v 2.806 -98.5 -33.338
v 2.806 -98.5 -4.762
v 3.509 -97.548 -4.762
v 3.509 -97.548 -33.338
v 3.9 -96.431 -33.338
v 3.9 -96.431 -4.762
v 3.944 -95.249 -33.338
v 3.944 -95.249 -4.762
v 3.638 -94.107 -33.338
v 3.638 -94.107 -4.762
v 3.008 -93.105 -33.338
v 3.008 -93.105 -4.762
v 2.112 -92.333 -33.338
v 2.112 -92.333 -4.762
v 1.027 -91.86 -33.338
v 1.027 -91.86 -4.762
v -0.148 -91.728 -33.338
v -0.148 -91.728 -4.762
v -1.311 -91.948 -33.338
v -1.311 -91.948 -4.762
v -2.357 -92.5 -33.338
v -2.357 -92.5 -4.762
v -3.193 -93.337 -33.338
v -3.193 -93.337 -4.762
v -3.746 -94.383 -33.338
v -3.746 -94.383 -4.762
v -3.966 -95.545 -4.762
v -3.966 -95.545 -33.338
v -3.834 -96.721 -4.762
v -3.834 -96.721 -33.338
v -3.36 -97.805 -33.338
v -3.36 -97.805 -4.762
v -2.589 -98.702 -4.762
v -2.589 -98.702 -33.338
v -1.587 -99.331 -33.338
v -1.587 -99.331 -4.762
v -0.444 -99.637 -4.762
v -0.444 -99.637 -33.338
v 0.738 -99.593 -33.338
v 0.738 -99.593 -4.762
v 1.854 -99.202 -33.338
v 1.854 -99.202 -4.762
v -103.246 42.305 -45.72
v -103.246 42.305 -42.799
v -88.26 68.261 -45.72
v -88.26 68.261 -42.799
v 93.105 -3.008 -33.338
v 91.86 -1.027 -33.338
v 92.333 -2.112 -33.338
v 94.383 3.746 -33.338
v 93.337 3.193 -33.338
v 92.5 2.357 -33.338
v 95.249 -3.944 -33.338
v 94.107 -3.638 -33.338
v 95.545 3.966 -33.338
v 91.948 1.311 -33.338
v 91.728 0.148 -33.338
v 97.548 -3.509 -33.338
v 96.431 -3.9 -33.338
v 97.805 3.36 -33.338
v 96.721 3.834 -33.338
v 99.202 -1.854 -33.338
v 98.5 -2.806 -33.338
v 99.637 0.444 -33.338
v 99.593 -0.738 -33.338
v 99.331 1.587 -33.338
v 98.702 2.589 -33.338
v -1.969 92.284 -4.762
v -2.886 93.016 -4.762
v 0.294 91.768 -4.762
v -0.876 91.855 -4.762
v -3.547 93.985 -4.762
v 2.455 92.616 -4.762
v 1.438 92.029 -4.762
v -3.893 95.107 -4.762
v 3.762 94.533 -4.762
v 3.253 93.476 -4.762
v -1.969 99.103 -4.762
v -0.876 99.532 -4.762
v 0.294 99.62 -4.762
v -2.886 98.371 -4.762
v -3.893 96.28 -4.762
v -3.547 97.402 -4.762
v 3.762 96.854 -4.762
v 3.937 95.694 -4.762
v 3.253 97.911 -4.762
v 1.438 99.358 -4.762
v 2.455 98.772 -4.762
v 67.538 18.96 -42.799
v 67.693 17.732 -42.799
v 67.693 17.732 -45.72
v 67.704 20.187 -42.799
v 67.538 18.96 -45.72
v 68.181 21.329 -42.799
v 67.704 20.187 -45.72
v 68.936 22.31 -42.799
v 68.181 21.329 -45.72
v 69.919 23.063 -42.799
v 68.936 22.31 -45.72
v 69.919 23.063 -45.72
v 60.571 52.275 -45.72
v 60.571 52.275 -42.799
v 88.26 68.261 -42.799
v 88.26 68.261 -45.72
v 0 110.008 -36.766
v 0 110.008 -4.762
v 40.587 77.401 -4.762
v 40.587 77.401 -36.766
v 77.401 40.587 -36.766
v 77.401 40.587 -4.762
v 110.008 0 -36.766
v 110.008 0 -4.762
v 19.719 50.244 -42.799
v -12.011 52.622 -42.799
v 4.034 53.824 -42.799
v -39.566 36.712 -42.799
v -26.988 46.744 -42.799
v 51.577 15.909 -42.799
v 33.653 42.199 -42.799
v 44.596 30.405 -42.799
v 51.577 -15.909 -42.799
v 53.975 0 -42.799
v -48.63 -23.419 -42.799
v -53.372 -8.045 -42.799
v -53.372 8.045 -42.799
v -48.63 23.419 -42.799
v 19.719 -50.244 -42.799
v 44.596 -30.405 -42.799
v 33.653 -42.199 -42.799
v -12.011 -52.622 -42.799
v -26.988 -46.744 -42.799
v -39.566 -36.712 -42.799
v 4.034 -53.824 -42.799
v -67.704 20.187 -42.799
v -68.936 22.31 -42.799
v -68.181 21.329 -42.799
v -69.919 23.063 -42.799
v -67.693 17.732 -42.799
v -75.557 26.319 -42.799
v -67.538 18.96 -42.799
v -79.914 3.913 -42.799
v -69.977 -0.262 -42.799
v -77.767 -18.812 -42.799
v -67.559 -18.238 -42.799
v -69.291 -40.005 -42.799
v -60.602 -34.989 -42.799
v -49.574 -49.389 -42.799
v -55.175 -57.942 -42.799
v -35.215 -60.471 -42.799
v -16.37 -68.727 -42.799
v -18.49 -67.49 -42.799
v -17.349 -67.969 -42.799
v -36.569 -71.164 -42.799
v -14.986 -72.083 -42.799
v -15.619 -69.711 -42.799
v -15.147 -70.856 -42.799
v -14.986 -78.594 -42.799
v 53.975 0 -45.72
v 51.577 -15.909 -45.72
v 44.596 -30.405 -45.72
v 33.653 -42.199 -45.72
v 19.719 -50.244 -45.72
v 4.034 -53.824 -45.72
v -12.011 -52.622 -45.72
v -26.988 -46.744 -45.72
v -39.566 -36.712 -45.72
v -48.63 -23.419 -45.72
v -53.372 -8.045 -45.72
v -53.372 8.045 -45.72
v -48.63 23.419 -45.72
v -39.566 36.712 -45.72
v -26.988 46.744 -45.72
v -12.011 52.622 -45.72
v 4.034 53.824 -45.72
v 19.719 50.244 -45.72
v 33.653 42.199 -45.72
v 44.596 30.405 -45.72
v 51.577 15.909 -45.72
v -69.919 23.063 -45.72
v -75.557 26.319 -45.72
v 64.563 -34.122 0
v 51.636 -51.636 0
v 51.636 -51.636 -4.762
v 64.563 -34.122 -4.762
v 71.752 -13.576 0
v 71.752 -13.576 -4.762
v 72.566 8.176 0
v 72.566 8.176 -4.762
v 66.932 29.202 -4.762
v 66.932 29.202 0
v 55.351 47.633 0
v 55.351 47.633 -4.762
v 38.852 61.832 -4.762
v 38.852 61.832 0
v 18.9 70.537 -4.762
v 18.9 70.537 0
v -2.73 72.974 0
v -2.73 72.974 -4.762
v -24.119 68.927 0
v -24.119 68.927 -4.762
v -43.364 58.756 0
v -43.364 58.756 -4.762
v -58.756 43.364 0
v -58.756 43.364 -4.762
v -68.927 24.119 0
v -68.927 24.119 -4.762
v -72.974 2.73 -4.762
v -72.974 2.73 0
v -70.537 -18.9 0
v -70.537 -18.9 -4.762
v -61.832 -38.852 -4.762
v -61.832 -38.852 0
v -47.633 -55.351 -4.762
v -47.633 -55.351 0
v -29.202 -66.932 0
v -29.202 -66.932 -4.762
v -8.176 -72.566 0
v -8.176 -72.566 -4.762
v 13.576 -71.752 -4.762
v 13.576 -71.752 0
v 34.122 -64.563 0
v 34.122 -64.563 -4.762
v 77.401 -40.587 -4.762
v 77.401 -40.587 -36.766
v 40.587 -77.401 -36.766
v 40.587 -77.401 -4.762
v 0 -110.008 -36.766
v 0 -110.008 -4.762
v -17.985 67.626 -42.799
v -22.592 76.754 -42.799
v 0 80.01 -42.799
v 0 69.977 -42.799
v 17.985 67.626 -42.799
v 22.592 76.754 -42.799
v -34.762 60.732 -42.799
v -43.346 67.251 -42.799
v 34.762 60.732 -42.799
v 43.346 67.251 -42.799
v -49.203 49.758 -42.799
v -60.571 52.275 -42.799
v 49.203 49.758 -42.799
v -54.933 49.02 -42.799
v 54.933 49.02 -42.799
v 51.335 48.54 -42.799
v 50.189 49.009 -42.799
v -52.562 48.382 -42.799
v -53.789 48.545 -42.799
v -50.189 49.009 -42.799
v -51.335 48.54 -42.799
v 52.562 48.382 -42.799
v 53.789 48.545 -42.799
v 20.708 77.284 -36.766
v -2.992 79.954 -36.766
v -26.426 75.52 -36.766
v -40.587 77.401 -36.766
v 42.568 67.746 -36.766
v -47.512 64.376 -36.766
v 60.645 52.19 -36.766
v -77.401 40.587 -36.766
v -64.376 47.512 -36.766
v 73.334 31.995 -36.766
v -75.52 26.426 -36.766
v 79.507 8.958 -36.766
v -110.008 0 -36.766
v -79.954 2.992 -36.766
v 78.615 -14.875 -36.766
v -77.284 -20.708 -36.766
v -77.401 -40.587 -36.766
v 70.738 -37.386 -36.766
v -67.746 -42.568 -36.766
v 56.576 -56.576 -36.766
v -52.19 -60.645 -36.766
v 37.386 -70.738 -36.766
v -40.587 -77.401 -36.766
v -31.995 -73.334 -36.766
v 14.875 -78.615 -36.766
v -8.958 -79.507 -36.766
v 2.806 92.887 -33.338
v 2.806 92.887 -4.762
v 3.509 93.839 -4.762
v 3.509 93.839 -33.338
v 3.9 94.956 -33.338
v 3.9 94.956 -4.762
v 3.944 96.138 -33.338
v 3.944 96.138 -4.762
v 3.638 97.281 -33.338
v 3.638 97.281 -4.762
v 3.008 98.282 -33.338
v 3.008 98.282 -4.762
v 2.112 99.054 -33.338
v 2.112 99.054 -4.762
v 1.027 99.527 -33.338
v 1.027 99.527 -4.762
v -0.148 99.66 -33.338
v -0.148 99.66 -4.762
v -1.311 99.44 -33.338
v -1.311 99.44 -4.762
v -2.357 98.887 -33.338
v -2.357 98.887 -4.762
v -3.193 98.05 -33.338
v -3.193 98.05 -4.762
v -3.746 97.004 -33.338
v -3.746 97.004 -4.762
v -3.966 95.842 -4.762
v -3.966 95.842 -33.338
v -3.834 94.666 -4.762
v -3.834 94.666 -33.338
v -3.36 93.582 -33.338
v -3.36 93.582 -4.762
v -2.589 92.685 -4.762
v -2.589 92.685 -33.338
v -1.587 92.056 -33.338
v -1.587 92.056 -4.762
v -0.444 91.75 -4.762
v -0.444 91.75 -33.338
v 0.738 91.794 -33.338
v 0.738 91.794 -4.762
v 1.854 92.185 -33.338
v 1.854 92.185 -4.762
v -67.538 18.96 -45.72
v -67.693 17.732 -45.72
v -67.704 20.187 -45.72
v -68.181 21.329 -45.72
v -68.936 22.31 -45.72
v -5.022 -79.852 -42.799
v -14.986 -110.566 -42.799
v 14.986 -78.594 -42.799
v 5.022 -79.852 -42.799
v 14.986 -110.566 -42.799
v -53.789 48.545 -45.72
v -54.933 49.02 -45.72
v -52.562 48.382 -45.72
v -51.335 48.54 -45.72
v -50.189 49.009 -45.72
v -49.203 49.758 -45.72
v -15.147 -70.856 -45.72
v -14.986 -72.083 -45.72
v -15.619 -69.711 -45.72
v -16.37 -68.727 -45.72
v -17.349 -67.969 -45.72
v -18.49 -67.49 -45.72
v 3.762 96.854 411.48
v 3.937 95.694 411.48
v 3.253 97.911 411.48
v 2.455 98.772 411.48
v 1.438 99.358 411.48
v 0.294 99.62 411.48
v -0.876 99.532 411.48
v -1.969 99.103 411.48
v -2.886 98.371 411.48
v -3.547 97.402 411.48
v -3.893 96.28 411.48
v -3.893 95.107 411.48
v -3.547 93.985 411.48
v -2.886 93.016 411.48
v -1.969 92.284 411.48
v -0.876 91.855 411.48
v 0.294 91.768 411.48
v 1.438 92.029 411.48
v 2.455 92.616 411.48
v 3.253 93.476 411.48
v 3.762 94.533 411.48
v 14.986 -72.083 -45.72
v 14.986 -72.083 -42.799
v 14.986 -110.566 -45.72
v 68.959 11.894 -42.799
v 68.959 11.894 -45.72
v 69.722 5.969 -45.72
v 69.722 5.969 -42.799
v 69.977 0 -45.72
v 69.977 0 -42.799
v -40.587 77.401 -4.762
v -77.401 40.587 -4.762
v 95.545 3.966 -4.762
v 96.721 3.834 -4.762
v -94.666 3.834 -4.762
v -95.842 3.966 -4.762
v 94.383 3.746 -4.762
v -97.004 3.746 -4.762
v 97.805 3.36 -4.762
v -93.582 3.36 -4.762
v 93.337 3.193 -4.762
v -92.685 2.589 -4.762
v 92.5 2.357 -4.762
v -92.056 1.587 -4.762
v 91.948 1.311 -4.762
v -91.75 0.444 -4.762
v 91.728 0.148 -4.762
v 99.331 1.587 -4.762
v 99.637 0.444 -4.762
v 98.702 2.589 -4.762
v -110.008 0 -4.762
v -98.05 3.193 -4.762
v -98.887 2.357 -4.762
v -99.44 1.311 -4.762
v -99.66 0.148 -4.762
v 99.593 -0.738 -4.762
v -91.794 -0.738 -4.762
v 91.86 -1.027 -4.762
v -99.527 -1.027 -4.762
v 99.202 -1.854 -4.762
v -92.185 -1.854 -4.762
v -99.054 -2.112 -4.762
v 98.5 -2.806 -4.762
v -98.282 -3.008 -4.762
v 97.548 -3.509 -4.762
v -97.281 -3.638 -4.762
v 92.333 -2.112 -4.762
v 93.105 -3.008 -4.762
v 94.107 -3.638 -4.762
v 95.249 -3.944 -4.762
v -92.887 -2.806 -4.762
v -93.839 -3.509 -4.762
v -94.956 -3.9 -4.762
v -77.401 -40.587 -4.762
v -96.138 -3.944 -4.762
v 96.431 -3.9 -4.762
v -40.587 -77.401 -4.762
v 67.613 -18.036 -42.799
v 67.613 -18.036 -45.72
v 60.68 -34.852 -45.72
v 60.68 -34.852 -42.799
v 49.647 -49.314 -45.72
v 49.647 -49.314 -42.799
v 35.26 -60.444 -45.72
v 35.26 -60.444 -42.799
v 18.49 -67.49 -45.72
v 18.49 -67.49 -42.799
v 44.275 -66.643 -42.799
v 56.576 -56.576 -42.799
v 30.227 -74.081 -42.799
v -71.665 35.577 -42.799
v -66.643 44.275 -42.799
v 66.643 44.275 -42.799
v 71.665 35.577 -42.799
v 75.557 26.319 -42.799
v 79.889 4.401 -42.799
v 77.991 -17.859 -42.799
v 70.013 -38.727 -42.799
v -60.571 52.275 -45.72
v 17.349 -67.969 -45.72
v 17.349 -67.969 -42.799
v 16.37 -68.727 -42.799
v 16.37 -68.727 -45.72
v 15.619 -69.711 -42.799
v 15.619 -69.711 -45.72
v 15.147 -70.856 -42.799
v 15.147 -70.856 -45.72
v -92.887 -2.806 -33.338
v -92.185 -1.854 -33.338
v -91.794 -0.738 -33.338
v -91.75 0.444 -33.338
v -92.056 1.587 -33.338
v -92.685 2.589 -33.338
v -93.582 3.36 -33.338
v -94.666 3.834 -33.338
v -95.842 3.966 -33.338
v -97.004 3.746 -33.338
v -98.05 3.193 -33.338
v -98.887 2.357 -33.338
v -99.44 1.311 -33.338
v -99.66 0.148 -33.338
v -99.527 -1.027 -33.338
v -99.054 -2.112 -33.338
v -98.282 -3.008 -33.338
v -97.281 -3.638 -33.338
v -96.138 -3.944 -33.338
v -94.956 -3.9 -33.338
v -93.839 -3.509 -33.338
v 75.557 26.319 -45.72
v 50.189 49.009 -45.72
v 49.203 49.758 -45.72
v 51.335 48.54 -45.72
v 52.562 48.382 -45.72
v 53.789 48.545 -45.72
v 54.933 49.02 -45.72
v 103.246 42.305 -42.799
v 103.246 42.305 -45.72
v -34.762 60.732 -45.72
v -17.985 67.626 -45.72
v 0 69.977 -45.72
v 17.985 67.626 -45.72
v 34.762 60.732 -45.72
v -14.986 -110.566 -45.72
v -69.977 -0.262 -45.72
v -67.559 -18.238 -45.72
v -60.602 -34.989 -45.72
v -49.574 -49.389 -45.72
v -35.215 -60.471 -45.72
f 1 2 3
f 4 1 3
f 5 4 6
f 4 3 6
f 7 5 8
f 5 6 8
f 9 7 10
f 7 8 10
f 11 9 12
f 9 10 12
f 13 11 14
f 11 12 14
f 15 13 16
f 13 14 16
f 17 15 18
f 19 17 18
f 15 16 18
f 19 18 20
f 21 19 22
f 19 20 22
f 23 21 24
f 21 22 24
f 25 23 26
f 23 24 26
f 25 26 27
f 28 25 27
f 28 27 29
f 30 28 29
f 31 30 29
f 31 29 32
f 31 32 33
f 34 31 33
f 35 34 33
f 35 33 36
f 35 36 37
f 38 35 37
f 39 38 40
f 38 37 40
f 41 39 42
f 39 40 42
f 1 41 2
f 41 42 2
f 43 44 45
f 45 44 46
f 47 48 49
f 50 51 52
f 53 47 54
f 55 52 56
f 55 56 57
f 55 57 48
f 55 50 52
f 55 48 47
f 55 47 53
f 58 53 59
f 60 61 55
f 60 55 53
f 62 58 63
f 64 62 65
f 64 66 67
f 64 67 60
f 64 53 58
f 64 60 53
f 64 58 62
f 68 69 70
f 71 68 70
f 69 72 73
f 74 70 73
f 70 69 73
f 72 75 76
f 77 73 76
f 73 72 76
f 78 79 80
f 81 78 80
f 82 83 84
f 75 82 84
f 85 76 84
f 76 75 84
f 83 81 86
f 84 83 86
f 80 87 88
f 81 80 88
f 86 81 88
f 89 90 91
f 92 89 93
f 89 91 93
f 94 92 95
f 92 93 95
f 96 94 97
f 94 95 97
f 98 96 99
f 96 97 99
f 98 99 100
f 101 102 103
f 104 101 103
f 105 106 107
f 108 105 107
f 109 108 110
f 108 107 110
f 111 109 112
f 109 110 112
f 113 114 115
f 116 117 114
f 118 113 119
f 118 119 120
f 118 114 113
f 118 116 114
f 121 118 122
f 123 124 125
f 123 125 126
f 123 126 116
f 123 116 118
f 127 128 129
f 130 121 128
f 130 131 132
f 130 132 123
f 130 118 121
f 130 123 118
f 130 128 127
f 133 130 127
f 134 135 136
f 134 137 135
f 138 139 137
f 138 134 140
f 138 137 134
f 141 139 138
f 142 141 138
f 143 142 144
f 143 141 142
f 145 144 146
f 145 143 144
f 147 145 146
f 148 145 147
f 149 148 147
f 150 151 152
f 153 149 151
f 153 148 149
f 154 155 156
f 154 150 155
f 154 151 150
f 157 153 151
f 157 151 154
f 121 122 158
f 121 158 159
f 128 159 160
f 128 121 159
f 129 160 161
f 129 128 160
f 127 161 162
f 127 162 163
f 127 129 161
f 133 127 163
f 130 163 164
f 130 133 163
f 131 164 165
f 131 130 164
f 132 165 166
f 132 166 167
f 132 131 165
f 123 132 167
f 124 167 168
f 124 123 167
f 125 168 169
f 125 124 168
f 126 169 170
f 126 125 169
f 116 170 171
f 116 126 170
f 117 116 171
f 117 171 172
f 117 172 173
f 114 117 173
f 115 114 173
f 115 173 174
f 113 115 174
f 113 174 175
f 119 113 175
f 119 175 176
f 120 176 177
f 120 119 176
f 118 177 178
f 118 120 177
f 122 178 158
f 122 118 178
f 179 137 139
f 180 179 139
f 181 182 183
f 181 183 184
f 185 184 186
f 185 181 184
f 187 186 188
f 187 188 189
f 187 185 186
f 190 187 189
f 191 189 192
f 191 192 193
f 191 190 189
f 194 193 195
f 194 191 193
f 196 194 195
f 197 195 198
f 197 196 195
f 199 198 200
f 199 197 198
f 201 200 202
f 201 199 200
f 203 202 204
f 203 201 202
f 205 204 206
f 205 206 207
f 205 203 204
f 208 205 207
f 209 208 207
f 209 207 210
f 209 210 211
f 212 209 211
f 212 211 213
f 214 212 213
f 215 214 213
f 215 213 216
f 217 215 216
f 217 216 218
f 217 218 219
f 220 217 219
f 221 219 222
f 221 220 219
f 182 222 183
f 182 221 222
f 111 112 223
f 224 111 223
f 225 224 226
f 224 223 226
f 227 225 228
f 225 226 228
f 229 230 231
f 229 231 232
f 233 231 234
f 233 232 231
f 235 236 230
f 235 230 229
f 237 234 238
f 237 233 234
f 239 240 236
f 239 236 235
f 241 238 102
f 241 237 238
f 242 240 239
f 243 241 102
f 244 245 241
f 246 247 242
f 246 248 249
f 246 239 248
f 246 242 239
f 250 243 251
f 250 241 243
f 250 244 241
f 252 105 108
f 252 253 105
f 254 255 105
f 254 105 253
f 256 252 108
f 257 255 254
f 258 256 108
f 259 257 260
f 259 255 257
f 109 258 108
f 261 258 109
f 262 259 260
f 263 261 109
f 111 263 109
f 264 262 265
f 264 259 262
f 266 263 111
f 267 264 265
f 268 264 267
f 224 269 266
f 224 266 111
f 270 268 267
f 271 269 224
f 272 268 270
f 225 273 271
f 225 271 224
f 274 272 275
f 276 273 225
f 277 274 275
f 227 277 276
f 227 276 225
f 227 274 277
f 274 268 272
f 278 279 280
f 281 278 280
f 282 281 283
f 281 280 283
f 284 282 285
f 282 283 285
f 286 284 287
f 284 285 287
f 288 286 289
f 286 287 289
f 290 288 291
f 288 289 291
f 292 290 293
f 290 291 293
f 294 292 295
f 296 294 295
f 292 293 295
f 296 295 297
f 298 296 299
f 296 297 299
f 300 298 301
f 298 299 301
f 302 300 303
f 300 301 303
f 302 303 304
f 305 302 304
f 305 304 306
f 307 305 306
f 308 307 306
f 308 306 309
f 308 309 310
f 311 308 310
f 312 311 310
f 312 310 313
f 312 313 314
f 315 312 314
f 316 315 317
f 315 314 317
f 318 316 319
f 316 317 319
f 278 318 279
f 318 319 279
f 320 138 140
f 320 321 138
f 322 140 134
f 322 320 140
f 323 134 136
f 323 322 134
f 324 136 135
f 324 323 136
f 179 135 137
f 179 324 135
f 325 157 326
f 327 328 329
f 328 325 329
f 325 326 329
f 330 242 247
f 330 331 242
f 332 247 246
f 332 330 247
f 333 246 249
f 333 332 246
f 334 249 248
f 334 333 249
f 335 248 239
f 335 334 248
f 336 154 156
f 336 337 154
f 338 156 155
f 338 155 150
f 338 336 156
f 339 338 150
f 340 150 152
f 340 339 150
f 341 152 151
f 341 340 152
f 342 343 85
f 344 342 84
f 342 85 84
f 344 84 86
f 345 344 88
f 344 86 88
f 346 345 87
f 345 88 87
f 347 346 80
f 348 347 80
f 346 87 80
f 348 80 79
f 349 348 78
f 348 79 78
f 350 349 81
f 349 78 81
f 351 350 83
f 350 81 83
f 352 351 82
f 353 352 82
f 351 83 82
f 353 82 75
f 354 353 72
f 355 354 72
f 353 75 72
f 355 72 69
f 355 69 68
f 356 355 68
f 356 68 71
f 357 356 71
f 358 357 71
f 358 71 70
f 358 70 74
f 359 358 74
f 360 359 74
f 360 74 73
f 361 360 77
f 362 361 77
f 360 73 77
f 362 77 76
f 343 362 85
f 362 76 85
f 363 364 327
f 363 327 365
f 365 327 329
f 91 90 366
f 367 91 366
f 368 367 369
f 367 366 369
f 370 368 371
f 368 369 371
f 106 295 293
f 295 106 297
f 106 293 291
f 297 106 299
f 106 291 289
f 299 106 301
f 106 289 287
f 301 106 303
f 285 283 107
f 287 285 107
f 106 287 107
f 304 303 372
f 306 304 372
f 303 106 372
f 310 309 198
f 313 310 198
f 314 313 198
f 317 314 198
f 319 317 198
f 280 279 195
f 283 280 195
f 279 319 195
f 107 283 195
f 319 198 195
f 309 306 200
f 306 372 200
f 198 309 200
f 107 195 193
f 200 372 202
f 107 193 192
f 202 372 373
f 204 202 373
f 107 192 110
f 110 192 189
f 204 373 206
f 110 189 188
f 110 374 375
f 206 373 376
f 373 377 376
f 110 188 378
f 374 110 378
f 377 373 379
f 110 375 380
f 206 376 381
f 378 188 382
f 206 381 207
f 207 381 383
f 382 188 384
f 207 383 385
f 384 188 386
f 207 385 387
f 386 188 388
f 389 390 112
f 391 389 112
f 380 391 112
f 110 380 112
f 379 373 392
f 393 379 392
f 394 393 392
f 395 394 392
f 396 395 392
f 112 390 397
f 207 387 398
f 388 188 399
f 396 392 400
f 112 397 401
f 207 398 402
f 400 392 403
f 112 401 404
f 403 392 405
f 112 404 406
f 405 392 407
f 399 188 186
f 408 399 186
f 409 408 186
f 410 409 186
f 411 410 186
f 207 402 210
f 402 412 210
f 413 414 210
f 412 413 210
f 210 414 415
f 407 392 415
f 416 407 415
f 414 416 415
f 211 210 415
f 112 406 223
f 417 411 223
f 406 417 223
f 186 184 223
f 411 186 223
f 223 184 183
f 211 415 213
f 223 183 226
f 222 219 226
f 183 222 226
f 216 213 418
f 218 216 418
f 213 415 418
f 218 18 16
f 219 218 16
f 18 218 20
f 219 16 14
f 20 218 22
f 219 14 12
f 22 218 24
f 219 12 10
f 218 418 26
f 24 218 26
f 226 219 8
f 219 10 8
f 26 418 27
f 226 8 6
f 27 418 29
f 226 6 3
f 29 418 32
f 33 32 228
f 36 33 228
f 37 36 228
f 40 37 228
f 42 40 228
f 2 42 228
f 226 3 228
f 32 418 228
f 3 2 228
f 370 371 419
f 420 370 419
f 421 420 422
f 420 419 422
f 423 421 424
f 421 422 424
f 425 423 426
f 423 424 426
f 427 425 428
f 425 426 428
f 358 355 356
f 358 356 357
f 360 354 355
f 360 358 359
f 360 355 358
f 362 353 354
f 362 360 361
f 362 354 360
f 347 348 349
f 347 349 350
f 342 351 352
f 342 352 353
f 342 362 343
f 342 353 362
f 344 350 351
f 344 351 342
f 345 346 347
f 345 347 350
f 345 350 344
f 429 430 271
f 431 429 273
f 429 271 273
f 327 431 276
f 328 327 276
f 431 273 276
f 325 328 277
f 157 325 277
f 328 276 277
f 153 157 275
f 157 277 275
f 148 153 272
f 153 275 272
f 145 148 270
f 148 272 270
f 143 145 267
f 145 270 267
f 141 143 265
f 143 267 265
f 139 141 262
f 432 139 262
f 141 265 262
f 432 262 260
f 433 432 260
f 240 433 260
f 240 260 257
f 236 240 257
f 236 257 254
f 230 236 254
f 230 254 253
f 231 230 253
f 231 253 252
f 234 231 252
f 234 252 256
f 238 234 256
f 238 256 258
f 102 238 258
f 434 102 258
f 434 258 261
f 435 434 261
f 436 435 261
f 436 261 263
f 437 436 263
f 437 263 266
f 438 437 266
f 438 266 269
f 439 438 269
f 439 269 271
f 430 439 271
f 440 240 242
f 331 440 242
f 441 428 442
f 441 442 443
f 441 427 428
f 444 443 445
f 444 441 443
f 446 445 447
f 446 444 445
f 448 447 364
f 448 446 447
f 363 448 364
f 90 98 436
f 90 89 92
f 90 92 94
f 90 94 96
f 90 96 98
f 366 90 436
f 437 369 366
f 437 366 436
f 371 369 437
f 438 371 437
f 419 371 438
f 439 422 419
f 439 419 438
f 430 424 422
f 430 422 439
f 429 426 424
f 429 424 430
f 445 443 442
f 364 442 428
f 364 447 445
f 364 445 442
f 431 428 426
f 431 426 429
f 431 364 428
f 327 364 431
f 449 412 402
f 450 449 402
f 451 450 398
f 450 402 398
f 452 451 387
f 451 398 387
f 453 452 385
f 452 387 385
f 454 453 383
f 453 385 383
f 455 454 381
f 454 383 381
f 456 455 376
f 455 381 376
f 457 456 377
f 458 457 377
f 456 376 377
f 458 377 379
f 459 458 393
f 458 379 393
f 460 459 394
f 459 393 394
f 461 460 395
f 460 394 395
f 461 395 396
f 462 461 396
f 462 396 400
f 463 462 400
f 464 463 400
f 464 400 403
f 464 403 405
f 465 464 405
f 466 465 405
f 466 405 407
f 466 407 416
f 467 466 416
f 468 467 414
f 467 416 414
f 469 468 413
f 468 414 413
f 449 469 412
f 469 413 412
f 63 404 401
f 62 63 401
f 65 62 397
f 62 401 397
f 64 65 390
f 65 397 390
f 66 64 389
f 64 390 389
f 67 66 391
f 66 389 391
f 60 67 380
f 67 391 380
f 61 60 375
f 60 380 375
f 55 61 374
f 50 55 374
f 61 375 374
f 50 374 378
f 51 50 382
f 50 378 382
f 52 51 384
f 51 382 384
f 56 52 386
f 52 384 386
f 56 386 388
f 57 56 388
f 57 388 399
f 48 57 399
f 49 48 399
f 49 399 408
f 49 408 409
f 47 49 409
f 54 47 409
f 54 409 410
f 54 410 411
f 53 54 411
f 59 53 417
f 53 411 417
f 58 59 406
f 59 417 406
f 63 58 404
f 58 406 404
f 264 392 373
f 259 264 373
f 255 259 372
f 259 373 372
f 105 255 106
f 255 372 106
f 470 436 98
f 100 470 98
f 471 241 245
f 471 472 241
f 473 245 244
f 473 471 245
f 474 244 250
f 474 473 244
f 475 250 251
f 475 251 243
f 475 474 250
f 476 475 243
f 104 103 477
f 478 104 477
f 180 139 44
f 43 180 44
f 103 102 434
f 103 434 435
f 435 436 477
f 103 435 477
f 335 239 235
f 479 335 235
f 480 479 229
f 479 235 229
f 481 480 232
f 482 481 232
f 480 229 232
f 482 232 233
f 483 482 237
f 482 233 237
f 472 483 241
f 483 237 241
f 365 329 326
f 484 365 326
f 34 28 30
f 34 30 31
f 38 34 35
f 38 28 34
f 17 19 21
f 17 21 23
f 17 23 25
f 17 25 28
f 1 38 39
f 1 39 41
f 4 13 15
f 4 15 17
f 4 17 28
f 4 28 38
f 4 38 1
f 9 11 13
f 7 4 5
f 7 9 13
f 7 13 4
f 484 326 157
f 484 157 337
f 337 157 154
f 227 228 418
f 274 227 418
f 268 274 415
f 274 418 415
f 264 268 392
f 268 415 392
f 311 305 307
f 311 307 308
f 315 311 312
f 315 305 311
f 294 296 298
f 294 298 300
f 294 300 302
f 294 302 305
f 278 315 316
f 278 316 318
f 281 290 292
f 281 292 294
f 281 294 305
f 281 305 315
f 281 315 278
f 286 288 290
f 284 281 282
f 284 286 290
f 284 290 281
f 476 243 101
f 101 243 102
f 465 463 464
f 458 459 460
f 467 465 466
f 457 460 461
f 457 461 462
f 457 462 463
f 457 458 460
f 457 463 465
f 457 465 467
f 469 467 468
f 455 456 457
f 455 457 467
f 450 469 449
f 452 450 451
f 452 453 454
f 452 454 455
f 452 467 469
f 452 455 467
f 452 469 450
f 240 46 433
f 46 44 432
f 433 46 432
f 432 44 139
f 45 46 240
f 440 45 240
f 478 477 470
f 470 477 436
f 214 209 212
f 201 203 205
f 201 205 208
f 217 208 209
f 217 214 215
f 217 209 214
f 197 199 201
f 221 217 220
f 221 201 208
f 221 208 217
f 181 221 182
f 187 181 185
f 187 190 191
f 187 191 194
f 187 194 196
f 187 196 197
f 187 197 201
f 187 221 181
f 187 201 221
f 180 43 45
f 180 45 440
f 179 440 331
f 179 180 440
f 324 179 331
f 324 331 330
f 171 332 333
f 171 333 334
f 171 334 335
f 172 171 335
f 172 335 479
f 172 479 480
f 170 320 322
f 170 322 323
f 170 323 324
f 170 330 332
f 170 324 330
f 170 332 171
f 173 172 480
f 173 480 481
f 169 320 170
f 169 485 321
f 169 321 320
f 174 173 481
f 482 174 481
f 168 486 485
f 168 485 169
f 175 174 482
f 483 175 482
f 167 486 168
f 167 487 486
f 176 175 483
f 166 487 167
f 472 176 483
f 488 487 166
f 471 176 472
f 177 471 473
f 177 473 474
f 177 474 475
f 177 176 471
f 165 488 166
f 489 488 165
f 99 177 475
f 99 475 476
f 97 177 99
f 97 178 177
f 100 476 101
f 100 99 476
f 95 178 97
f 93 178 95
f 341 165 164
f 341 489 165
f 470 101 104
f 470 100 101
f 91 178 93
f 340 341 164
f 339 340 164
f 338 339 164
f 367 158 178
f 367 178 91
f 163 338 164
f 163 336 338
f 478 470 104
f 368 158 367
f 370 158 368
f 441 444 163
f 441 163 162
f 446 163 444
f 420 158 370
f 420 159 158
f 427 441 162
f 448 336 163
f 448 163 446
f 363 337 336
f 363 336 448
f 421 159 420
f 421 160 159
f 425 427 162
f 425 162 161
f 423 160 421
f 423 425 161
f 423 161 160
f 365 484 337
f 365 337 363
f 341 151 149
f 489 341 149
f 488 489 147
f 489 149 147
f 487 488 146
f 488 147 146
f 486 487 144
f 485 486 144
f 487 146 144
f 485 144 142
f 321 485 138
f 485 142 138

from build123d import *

# Parameters (mm, degrees)
F0_R      = 73.025
F1_DEPTH  = 4.7625
F3_DEPTH  = 32.004
F4_R      = 3.96875
F5_DEPTH  = 28.575
F6_R      = 80.01
F7_DEPTH  = 6.0325
F9_ANGLE  = -45
F10_R     = 53.975
F11_DEPTH = 2.921
F12_R     = 3.937
F13_DEPTH = 416.2425
F14_R     = 4.7625


with BuildPart() as f1:
    # F0 (on Top) → F1 (new body)
    with BuildSketch(Plane.XY):
        Circle(F0_R)
    extrude(amount=-F1_DEPTH)

    # F2 (on face) → F3 (join)
    with BuildSketch(Plane(origin=(0, 0, -4.7625), x_dir=(1, 0, 0), z_dir=(0, 0, -1))):
        with BuildLine():
            ThreePointArc((-77.7875, 77.7875), (-84.1375, 0), (-77.7875, -77.7875))
            ThreePointArc((-77.7875, -77.7875), (0, -84.1375), (77.7875, -77.7875))
            ThreePointArc((77.7875, -77.7875), (84.1375, 0), (77.7875, 77.7875))
            ThreePointArc((77.7875, 77.7875), (0, 84.1375), (-77.7875, 77.7875))
        make_face()
    extrude(amount=F3_DEPTH)

    # F4 (on face) → F5 (cut)
    with BuildSketch(Plane.XY.offset(-4.7625)):
        with Locations((-67.6656, 67.6656)):
            Circle(F4_R)
        with Locations((-67.6656, -67.6656)):
            Circle(F4_R)
        with Locations((67.6656, -67.6656)):
            Circle(F4_R)
        with Locations((67.6656, 67.6656)):
            Circle(F4_R)
    extrude(amount=-F5_DEPTH, mode=Mode.SUBTRACT)

    # F6 (on face) → F7 (join)
    with BuildSketch(Plane(origin=(0, 0, -36.7665), x_dir=(1, 0, 0), z_dir=(0, 0, -1))):
        Circle(F6_R)
    extrude(amount=F7_DEPTH)


with BuildPart() as f1_1:
    # F9: moved
    add(f1.part.rotate(Axis((0, 0, 32.1254618466), (0, 0, 1)), F9_ANGLE))

    # F10 (on face) → F11 (join)
    with BuildSketch(Plane(origin=(0, 0, -42.799), x_dir=(1, 0, 0), z_dir=(0, 0, -1))):
        with BuildLine():
            Line((-14.986, 68.3534953971), (14.986, 68.3534953971))
            ThreePointArc((14.986, 68.3534953971), (0, 69.977), (-14.986, 68.3534953971))
        make_face()
        with BuildLine():
            Line((-51.7028634513, -47.1550043997), (-66.6888634513, -21.1984909974))
            ThreePointArc((-66.6888634513, -21.1984909974), (-60.6018596806, -34.9885), (-51.7028634513, -47.1550043997))
        make_face()
        with BuildLine():
            ThreePointArc((51.7028634513, -47.1550043997), (60.6018596806, -34.9885), (66.6888634513, -21.1984909974))
            Line((66.6888634513, -21.1984909974), (51.7028634513, -47.1550043997))
        make_face()
        with BuildLine():
            ThreePointArc((66.6888634513, -21.1984909974), (69.1500799954, -10.7259948551), (69.977, 0))
            ThreePointArc((69.977, 0), (54.5227285221, 43.8640240231), (14.986, 68.3534953971))
            Line((14.986, 68.3534953971), (-14.986, 68.3534953971))
            ThreePointArc((-14.986, 68.3534953971), (-60.6018596806, 34.9885), (-66.6888634513, -21.1984909974))
            Line((-66.6888634513, -21.1984909974), (-51.7028634513, -47.1550043997))
            ThreePointArc((-51.7028634513, -47.1550043997), (0, -69.977), (51.7028634513, -47.1550043997))
            Line((51.7028634513, -47.1550043997), (66.6888634513, -21.1984909974))
        make_face()
        Circle(F10_R, mode=Mode.SUBTRACT)
        with BuildLine():
            ThreePointArc((-60.5714174881, -52.2752664601), (-69.2906925568, -40.005), (-75.5574174881, -26.3187530579))
            Line((-75.5574174881, -26.3187530579), (-103.246138, -42.3048432989))
            Line((-103.246138, -42.3048432989), (-88.260138, -68.2613567011))
            Line((-88.260138, -68.2613567011), (-60.5714174881, -52.2752664601))
        make_face()
        with BuildLine():
            Line((103.246138, -42.3048432989), (75.5574174881, -26.3187530579))
            ThreePointArc((75.5574174881, -26.3187530579), (69.2906925568, -40.005), (60.5714174881, -52.2752664601))
            Line((60.5714174881, -52.2752664601), (88.260138, -68.2613567011))
            Line((88.260138, -68.2613567011), (103.246138, -42.3048432989))
        make_face()
        with BuildLine():
            ThreePointArc((-14.986, 68.3534953971), (0, 69.977), (14.986, 68.3534953971))
            Line((14.986, 68.3534953971), (14.986, 78.594019518))
            ThreePointArc((14.986, 78.594019518), (0, 80.01), (-14.986, 78.594019518))
            Line((-14.986, 78.594019518), (-14.986, 68.3534953971))
        make_face()
        with BuildLine():
            ThreePointArc((-51.7028634513, -47.1550043997), (-60.6018596806, -34.9885), (-66.6888634513, -21.1984909974))
            Line((-66.6888634513, -21.1984909974), (-75.5574174881, -26.3187530579))
            ThreePointArc((-75.5574174881, -26.3187530579), (-69.2906925568, -40.005), (-60.5714174881, -52.2752664601))
            Line((-60.5714174881, -52.2752664601), (-51.7028634513, -47.1550043997))
        make_face()
        with BuildLine():
            Line((75.5574174881, -26.3187530579), (66.6888634513, -21.1984909974))
            ThreePointArc((66.6888634513, -21.1984909974), (60.6018596806, -34.9885), (51.7028634513, -47.1550043997))
            Line((51.7028634513, -47.1550043997), (60.5714174881, -52.2752664601))
            ThreePointArc((60.5714174881, -52.2752664601), (69.2906925568, -40.005), (75.5574174881, -26.3187530579))
        make_face()
        with BuildLine():
            ThreePointArc((-14.986, 78.594019518), (0, 80.01), (14.986, 78.594019518))
            Line((14.986, 78.594019518), (14.986, 110.5662))
            Line((14.986, 110.5662), (-14.986, 110.5662))
            Line((-14.986, 110.5662), (-14.986, 78.594019518))
        make_face()
    extrude(amount=F11_DEPTH)

    # F14
    f14_edges = [f1_1.edges().sort_by_distance(p)[0] for p in [
        (14.986, -68.353495, -44.2595),
        (-14.986, -68.353495, -44.2595),
        (-66.688863, 21.198491, -44.2595),
        (-51.702863, 47.155004, -44.2595),
        (51.702863, 47.155004, -44.2595),
        (66.688863, 21.198491, -44.2595),
    ]]
    fillet(f14_edges, radius=F14_R)


with BuildPart() as f13:
    # F12 (on face) → F13 (new body)
    with BuildSketch(Plane.XY.offset(-4.7625)):
        with Locations((0, 95.6936092261)):
            Circle(F12_R)
    extrude(amount=F13_DEPTH)


solid = Compound([f1_1.part, f13.part])
